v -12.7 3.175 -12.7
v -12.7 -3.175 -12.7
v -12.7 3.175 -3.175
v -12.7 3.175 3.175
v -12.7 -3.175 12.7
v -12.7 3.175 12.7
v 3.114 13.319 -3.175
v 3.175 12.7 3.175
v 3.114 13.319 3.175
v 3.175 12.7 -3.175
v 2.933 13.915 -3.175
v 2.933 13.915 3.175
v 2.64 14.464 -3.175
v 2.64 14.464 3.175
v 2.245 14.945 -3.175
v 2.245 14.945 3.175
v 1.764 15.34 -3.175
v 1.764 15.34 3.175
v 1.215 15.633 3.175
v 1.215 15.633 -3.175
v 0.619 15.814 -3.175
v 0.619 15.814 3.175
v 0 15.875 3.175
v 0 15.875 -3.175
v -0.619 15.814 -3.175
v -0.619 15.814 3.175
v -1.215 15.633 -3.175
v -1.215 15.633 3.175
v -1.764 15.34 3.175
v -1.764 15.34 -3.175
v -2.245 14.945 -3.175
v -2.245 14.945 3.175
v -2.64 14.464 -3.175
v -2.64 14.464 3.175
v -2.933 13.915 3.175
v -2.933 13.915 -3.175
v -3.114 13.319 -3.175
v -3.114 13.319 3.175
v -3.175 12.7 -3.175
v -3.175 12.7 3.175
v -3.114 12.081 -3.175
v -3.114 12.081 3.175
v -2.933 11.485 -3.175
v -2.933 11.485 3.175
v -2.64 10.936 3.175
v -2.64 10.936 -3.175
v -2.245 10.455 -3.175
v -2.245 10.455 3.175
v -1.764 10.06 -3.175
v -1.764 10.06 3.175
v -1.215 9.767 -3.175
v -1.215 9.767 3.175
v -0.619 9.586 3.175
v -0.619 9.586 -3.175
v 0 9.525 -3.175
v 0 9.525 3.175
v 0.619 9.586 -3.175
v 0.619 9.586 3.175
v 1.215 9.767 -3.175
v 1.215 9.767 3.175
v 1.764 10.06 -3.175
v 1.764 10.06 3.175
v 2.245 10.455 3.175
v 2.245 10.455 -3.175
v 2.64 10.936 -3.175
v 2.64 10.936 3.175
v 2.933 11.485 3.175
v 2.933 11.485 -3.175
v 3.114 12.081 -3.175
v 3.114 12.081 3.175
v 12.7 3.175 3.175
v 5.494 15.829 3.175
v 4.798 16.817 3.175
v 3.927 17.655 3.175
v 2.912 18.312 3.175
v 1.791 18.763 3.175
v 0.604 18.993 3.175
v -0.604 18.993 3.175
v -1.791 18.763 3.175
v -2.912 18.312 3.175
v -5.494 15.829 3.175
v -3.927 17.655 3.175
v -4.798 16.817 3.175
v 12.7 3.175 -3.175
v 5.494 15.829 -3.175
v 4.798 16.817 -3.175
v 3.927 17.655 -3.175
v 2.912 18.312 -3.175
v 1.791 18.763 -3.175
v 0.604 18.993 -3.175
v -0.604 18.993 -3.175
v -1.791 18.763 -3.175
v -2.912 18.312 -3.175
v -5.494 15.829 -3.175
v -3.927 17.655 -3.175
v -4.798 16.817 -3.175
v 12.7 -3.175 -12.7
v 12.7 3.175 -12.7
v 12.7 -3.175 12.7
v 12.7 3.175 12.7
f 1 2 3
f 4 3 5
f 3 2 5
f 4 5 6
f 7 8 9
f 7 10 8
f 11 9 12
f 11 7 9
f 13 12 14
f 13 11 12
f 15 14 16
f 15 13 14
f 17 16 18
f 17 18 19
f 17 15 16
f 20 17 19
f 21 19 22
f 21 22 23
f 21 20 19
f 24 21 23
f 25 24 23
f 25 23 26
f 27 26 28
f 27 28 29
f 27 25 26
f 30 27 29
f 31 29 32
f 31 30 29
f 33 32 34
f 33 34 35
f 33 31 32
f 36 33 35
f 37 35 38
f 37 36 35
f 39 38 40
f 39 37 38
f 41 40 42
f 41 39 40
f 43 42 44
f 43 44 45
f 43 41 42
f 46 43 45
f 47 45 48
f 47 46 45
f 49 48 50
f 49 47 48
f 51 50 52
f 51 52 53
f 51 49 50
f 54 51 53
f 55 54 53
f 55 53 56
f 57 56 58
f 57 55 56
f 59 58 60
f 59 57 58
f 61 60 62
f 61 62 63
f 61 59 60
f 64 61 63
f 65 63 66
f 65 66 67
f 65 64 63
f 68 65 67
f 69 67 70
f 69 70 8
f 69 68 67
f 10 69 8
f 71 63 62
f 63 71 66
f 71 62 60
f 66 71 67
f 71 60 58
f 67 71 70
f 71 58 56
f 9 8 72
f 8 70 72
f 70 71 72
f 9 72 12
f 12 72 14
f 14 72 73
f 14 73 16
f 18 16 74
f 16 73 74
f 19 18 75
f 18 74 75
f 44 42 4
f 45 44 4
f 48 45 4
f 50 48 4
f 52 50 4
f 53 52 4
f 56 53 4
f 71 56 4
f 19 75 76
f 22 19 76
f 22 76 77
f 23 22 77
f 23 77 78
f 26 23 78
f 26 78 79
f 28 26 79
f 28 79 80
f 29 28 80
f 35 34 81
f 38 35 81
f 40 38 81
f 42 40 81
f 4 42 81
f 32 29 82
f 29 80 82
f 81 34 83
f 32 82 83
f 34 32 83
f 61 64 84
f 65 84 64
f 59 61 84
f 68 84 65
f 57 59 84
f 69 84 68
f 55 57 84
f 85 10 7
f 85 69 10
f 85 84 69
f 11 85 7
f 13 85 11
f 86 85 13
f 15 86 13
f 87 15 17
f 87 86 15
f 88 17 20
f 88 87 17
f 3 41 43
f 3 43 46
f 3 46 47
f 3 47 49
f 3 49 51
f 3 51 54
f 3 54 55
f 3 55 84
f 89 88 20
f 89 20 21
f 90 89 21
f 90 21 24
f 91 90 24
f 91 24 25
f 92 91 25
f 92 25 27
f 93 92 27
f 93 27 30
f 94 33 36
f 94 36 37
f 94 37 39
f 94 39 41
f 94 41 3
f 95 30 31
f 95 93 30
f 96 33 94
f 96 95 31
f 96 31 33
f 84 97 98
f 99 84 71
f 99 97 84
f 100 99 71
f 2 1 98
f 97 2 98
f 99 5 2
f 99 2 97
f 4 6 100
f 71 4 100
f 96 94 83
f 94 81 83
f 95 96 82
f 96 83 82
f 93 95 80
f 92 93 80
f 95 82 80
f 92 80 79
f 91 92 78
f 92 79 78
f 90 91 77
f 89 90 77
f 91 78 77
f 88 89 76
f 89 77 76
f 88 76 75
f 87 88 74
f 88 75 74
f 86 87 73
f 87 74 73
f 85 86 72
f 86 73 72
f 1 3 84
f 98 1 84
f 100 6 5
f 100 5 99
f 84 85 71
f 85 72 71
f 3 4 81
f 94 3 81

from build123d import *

# Parameters (mm, degrees)
SKETCH1_W           = 25.4
SKETCH1_H           = 6.35
BOSS_EXTRUDE1_DEPTH = 12.7
SKETCH2_R           = 3.175
BOSS_EXTRUDE2_DEPTH = 3.175


with BuildPart() as part:
    # Sketch1 → Boss-Extrude1 (new body, symmetric)
    with BuildSketch(Plane.XY):
        Rectangle(SKETCH1_W, SKETCH1_H)
    extrude(amount=BOSS_EXTRUDE1_DEPTH, both=True)

    # Sketch2 → Boss-Extrude2 (add, symmetric)
    with BuildSketch(Plane.XY):
        with BuildLine():
            Line((-12.7, 3.175), (-5.493685279, 15.828674269))
            ThreePointArc((-5.493685279, 15.828674269), (0, 19.022118366), (5.493685279, 15.828674269))
            Line((5.493685279, 15.828674269), (12.7, 3.175))
            Line((12.7, 3.175), (-12.7, 3.175))
        make_face()
        with Locations((0, 12.7)):
            Circle(SKETCH2_R, mode=Mode.SUBTRACT)
    extrude(amount=BOSS_EXTRUDE2_DEPTH, both=True)


solid = part.part
